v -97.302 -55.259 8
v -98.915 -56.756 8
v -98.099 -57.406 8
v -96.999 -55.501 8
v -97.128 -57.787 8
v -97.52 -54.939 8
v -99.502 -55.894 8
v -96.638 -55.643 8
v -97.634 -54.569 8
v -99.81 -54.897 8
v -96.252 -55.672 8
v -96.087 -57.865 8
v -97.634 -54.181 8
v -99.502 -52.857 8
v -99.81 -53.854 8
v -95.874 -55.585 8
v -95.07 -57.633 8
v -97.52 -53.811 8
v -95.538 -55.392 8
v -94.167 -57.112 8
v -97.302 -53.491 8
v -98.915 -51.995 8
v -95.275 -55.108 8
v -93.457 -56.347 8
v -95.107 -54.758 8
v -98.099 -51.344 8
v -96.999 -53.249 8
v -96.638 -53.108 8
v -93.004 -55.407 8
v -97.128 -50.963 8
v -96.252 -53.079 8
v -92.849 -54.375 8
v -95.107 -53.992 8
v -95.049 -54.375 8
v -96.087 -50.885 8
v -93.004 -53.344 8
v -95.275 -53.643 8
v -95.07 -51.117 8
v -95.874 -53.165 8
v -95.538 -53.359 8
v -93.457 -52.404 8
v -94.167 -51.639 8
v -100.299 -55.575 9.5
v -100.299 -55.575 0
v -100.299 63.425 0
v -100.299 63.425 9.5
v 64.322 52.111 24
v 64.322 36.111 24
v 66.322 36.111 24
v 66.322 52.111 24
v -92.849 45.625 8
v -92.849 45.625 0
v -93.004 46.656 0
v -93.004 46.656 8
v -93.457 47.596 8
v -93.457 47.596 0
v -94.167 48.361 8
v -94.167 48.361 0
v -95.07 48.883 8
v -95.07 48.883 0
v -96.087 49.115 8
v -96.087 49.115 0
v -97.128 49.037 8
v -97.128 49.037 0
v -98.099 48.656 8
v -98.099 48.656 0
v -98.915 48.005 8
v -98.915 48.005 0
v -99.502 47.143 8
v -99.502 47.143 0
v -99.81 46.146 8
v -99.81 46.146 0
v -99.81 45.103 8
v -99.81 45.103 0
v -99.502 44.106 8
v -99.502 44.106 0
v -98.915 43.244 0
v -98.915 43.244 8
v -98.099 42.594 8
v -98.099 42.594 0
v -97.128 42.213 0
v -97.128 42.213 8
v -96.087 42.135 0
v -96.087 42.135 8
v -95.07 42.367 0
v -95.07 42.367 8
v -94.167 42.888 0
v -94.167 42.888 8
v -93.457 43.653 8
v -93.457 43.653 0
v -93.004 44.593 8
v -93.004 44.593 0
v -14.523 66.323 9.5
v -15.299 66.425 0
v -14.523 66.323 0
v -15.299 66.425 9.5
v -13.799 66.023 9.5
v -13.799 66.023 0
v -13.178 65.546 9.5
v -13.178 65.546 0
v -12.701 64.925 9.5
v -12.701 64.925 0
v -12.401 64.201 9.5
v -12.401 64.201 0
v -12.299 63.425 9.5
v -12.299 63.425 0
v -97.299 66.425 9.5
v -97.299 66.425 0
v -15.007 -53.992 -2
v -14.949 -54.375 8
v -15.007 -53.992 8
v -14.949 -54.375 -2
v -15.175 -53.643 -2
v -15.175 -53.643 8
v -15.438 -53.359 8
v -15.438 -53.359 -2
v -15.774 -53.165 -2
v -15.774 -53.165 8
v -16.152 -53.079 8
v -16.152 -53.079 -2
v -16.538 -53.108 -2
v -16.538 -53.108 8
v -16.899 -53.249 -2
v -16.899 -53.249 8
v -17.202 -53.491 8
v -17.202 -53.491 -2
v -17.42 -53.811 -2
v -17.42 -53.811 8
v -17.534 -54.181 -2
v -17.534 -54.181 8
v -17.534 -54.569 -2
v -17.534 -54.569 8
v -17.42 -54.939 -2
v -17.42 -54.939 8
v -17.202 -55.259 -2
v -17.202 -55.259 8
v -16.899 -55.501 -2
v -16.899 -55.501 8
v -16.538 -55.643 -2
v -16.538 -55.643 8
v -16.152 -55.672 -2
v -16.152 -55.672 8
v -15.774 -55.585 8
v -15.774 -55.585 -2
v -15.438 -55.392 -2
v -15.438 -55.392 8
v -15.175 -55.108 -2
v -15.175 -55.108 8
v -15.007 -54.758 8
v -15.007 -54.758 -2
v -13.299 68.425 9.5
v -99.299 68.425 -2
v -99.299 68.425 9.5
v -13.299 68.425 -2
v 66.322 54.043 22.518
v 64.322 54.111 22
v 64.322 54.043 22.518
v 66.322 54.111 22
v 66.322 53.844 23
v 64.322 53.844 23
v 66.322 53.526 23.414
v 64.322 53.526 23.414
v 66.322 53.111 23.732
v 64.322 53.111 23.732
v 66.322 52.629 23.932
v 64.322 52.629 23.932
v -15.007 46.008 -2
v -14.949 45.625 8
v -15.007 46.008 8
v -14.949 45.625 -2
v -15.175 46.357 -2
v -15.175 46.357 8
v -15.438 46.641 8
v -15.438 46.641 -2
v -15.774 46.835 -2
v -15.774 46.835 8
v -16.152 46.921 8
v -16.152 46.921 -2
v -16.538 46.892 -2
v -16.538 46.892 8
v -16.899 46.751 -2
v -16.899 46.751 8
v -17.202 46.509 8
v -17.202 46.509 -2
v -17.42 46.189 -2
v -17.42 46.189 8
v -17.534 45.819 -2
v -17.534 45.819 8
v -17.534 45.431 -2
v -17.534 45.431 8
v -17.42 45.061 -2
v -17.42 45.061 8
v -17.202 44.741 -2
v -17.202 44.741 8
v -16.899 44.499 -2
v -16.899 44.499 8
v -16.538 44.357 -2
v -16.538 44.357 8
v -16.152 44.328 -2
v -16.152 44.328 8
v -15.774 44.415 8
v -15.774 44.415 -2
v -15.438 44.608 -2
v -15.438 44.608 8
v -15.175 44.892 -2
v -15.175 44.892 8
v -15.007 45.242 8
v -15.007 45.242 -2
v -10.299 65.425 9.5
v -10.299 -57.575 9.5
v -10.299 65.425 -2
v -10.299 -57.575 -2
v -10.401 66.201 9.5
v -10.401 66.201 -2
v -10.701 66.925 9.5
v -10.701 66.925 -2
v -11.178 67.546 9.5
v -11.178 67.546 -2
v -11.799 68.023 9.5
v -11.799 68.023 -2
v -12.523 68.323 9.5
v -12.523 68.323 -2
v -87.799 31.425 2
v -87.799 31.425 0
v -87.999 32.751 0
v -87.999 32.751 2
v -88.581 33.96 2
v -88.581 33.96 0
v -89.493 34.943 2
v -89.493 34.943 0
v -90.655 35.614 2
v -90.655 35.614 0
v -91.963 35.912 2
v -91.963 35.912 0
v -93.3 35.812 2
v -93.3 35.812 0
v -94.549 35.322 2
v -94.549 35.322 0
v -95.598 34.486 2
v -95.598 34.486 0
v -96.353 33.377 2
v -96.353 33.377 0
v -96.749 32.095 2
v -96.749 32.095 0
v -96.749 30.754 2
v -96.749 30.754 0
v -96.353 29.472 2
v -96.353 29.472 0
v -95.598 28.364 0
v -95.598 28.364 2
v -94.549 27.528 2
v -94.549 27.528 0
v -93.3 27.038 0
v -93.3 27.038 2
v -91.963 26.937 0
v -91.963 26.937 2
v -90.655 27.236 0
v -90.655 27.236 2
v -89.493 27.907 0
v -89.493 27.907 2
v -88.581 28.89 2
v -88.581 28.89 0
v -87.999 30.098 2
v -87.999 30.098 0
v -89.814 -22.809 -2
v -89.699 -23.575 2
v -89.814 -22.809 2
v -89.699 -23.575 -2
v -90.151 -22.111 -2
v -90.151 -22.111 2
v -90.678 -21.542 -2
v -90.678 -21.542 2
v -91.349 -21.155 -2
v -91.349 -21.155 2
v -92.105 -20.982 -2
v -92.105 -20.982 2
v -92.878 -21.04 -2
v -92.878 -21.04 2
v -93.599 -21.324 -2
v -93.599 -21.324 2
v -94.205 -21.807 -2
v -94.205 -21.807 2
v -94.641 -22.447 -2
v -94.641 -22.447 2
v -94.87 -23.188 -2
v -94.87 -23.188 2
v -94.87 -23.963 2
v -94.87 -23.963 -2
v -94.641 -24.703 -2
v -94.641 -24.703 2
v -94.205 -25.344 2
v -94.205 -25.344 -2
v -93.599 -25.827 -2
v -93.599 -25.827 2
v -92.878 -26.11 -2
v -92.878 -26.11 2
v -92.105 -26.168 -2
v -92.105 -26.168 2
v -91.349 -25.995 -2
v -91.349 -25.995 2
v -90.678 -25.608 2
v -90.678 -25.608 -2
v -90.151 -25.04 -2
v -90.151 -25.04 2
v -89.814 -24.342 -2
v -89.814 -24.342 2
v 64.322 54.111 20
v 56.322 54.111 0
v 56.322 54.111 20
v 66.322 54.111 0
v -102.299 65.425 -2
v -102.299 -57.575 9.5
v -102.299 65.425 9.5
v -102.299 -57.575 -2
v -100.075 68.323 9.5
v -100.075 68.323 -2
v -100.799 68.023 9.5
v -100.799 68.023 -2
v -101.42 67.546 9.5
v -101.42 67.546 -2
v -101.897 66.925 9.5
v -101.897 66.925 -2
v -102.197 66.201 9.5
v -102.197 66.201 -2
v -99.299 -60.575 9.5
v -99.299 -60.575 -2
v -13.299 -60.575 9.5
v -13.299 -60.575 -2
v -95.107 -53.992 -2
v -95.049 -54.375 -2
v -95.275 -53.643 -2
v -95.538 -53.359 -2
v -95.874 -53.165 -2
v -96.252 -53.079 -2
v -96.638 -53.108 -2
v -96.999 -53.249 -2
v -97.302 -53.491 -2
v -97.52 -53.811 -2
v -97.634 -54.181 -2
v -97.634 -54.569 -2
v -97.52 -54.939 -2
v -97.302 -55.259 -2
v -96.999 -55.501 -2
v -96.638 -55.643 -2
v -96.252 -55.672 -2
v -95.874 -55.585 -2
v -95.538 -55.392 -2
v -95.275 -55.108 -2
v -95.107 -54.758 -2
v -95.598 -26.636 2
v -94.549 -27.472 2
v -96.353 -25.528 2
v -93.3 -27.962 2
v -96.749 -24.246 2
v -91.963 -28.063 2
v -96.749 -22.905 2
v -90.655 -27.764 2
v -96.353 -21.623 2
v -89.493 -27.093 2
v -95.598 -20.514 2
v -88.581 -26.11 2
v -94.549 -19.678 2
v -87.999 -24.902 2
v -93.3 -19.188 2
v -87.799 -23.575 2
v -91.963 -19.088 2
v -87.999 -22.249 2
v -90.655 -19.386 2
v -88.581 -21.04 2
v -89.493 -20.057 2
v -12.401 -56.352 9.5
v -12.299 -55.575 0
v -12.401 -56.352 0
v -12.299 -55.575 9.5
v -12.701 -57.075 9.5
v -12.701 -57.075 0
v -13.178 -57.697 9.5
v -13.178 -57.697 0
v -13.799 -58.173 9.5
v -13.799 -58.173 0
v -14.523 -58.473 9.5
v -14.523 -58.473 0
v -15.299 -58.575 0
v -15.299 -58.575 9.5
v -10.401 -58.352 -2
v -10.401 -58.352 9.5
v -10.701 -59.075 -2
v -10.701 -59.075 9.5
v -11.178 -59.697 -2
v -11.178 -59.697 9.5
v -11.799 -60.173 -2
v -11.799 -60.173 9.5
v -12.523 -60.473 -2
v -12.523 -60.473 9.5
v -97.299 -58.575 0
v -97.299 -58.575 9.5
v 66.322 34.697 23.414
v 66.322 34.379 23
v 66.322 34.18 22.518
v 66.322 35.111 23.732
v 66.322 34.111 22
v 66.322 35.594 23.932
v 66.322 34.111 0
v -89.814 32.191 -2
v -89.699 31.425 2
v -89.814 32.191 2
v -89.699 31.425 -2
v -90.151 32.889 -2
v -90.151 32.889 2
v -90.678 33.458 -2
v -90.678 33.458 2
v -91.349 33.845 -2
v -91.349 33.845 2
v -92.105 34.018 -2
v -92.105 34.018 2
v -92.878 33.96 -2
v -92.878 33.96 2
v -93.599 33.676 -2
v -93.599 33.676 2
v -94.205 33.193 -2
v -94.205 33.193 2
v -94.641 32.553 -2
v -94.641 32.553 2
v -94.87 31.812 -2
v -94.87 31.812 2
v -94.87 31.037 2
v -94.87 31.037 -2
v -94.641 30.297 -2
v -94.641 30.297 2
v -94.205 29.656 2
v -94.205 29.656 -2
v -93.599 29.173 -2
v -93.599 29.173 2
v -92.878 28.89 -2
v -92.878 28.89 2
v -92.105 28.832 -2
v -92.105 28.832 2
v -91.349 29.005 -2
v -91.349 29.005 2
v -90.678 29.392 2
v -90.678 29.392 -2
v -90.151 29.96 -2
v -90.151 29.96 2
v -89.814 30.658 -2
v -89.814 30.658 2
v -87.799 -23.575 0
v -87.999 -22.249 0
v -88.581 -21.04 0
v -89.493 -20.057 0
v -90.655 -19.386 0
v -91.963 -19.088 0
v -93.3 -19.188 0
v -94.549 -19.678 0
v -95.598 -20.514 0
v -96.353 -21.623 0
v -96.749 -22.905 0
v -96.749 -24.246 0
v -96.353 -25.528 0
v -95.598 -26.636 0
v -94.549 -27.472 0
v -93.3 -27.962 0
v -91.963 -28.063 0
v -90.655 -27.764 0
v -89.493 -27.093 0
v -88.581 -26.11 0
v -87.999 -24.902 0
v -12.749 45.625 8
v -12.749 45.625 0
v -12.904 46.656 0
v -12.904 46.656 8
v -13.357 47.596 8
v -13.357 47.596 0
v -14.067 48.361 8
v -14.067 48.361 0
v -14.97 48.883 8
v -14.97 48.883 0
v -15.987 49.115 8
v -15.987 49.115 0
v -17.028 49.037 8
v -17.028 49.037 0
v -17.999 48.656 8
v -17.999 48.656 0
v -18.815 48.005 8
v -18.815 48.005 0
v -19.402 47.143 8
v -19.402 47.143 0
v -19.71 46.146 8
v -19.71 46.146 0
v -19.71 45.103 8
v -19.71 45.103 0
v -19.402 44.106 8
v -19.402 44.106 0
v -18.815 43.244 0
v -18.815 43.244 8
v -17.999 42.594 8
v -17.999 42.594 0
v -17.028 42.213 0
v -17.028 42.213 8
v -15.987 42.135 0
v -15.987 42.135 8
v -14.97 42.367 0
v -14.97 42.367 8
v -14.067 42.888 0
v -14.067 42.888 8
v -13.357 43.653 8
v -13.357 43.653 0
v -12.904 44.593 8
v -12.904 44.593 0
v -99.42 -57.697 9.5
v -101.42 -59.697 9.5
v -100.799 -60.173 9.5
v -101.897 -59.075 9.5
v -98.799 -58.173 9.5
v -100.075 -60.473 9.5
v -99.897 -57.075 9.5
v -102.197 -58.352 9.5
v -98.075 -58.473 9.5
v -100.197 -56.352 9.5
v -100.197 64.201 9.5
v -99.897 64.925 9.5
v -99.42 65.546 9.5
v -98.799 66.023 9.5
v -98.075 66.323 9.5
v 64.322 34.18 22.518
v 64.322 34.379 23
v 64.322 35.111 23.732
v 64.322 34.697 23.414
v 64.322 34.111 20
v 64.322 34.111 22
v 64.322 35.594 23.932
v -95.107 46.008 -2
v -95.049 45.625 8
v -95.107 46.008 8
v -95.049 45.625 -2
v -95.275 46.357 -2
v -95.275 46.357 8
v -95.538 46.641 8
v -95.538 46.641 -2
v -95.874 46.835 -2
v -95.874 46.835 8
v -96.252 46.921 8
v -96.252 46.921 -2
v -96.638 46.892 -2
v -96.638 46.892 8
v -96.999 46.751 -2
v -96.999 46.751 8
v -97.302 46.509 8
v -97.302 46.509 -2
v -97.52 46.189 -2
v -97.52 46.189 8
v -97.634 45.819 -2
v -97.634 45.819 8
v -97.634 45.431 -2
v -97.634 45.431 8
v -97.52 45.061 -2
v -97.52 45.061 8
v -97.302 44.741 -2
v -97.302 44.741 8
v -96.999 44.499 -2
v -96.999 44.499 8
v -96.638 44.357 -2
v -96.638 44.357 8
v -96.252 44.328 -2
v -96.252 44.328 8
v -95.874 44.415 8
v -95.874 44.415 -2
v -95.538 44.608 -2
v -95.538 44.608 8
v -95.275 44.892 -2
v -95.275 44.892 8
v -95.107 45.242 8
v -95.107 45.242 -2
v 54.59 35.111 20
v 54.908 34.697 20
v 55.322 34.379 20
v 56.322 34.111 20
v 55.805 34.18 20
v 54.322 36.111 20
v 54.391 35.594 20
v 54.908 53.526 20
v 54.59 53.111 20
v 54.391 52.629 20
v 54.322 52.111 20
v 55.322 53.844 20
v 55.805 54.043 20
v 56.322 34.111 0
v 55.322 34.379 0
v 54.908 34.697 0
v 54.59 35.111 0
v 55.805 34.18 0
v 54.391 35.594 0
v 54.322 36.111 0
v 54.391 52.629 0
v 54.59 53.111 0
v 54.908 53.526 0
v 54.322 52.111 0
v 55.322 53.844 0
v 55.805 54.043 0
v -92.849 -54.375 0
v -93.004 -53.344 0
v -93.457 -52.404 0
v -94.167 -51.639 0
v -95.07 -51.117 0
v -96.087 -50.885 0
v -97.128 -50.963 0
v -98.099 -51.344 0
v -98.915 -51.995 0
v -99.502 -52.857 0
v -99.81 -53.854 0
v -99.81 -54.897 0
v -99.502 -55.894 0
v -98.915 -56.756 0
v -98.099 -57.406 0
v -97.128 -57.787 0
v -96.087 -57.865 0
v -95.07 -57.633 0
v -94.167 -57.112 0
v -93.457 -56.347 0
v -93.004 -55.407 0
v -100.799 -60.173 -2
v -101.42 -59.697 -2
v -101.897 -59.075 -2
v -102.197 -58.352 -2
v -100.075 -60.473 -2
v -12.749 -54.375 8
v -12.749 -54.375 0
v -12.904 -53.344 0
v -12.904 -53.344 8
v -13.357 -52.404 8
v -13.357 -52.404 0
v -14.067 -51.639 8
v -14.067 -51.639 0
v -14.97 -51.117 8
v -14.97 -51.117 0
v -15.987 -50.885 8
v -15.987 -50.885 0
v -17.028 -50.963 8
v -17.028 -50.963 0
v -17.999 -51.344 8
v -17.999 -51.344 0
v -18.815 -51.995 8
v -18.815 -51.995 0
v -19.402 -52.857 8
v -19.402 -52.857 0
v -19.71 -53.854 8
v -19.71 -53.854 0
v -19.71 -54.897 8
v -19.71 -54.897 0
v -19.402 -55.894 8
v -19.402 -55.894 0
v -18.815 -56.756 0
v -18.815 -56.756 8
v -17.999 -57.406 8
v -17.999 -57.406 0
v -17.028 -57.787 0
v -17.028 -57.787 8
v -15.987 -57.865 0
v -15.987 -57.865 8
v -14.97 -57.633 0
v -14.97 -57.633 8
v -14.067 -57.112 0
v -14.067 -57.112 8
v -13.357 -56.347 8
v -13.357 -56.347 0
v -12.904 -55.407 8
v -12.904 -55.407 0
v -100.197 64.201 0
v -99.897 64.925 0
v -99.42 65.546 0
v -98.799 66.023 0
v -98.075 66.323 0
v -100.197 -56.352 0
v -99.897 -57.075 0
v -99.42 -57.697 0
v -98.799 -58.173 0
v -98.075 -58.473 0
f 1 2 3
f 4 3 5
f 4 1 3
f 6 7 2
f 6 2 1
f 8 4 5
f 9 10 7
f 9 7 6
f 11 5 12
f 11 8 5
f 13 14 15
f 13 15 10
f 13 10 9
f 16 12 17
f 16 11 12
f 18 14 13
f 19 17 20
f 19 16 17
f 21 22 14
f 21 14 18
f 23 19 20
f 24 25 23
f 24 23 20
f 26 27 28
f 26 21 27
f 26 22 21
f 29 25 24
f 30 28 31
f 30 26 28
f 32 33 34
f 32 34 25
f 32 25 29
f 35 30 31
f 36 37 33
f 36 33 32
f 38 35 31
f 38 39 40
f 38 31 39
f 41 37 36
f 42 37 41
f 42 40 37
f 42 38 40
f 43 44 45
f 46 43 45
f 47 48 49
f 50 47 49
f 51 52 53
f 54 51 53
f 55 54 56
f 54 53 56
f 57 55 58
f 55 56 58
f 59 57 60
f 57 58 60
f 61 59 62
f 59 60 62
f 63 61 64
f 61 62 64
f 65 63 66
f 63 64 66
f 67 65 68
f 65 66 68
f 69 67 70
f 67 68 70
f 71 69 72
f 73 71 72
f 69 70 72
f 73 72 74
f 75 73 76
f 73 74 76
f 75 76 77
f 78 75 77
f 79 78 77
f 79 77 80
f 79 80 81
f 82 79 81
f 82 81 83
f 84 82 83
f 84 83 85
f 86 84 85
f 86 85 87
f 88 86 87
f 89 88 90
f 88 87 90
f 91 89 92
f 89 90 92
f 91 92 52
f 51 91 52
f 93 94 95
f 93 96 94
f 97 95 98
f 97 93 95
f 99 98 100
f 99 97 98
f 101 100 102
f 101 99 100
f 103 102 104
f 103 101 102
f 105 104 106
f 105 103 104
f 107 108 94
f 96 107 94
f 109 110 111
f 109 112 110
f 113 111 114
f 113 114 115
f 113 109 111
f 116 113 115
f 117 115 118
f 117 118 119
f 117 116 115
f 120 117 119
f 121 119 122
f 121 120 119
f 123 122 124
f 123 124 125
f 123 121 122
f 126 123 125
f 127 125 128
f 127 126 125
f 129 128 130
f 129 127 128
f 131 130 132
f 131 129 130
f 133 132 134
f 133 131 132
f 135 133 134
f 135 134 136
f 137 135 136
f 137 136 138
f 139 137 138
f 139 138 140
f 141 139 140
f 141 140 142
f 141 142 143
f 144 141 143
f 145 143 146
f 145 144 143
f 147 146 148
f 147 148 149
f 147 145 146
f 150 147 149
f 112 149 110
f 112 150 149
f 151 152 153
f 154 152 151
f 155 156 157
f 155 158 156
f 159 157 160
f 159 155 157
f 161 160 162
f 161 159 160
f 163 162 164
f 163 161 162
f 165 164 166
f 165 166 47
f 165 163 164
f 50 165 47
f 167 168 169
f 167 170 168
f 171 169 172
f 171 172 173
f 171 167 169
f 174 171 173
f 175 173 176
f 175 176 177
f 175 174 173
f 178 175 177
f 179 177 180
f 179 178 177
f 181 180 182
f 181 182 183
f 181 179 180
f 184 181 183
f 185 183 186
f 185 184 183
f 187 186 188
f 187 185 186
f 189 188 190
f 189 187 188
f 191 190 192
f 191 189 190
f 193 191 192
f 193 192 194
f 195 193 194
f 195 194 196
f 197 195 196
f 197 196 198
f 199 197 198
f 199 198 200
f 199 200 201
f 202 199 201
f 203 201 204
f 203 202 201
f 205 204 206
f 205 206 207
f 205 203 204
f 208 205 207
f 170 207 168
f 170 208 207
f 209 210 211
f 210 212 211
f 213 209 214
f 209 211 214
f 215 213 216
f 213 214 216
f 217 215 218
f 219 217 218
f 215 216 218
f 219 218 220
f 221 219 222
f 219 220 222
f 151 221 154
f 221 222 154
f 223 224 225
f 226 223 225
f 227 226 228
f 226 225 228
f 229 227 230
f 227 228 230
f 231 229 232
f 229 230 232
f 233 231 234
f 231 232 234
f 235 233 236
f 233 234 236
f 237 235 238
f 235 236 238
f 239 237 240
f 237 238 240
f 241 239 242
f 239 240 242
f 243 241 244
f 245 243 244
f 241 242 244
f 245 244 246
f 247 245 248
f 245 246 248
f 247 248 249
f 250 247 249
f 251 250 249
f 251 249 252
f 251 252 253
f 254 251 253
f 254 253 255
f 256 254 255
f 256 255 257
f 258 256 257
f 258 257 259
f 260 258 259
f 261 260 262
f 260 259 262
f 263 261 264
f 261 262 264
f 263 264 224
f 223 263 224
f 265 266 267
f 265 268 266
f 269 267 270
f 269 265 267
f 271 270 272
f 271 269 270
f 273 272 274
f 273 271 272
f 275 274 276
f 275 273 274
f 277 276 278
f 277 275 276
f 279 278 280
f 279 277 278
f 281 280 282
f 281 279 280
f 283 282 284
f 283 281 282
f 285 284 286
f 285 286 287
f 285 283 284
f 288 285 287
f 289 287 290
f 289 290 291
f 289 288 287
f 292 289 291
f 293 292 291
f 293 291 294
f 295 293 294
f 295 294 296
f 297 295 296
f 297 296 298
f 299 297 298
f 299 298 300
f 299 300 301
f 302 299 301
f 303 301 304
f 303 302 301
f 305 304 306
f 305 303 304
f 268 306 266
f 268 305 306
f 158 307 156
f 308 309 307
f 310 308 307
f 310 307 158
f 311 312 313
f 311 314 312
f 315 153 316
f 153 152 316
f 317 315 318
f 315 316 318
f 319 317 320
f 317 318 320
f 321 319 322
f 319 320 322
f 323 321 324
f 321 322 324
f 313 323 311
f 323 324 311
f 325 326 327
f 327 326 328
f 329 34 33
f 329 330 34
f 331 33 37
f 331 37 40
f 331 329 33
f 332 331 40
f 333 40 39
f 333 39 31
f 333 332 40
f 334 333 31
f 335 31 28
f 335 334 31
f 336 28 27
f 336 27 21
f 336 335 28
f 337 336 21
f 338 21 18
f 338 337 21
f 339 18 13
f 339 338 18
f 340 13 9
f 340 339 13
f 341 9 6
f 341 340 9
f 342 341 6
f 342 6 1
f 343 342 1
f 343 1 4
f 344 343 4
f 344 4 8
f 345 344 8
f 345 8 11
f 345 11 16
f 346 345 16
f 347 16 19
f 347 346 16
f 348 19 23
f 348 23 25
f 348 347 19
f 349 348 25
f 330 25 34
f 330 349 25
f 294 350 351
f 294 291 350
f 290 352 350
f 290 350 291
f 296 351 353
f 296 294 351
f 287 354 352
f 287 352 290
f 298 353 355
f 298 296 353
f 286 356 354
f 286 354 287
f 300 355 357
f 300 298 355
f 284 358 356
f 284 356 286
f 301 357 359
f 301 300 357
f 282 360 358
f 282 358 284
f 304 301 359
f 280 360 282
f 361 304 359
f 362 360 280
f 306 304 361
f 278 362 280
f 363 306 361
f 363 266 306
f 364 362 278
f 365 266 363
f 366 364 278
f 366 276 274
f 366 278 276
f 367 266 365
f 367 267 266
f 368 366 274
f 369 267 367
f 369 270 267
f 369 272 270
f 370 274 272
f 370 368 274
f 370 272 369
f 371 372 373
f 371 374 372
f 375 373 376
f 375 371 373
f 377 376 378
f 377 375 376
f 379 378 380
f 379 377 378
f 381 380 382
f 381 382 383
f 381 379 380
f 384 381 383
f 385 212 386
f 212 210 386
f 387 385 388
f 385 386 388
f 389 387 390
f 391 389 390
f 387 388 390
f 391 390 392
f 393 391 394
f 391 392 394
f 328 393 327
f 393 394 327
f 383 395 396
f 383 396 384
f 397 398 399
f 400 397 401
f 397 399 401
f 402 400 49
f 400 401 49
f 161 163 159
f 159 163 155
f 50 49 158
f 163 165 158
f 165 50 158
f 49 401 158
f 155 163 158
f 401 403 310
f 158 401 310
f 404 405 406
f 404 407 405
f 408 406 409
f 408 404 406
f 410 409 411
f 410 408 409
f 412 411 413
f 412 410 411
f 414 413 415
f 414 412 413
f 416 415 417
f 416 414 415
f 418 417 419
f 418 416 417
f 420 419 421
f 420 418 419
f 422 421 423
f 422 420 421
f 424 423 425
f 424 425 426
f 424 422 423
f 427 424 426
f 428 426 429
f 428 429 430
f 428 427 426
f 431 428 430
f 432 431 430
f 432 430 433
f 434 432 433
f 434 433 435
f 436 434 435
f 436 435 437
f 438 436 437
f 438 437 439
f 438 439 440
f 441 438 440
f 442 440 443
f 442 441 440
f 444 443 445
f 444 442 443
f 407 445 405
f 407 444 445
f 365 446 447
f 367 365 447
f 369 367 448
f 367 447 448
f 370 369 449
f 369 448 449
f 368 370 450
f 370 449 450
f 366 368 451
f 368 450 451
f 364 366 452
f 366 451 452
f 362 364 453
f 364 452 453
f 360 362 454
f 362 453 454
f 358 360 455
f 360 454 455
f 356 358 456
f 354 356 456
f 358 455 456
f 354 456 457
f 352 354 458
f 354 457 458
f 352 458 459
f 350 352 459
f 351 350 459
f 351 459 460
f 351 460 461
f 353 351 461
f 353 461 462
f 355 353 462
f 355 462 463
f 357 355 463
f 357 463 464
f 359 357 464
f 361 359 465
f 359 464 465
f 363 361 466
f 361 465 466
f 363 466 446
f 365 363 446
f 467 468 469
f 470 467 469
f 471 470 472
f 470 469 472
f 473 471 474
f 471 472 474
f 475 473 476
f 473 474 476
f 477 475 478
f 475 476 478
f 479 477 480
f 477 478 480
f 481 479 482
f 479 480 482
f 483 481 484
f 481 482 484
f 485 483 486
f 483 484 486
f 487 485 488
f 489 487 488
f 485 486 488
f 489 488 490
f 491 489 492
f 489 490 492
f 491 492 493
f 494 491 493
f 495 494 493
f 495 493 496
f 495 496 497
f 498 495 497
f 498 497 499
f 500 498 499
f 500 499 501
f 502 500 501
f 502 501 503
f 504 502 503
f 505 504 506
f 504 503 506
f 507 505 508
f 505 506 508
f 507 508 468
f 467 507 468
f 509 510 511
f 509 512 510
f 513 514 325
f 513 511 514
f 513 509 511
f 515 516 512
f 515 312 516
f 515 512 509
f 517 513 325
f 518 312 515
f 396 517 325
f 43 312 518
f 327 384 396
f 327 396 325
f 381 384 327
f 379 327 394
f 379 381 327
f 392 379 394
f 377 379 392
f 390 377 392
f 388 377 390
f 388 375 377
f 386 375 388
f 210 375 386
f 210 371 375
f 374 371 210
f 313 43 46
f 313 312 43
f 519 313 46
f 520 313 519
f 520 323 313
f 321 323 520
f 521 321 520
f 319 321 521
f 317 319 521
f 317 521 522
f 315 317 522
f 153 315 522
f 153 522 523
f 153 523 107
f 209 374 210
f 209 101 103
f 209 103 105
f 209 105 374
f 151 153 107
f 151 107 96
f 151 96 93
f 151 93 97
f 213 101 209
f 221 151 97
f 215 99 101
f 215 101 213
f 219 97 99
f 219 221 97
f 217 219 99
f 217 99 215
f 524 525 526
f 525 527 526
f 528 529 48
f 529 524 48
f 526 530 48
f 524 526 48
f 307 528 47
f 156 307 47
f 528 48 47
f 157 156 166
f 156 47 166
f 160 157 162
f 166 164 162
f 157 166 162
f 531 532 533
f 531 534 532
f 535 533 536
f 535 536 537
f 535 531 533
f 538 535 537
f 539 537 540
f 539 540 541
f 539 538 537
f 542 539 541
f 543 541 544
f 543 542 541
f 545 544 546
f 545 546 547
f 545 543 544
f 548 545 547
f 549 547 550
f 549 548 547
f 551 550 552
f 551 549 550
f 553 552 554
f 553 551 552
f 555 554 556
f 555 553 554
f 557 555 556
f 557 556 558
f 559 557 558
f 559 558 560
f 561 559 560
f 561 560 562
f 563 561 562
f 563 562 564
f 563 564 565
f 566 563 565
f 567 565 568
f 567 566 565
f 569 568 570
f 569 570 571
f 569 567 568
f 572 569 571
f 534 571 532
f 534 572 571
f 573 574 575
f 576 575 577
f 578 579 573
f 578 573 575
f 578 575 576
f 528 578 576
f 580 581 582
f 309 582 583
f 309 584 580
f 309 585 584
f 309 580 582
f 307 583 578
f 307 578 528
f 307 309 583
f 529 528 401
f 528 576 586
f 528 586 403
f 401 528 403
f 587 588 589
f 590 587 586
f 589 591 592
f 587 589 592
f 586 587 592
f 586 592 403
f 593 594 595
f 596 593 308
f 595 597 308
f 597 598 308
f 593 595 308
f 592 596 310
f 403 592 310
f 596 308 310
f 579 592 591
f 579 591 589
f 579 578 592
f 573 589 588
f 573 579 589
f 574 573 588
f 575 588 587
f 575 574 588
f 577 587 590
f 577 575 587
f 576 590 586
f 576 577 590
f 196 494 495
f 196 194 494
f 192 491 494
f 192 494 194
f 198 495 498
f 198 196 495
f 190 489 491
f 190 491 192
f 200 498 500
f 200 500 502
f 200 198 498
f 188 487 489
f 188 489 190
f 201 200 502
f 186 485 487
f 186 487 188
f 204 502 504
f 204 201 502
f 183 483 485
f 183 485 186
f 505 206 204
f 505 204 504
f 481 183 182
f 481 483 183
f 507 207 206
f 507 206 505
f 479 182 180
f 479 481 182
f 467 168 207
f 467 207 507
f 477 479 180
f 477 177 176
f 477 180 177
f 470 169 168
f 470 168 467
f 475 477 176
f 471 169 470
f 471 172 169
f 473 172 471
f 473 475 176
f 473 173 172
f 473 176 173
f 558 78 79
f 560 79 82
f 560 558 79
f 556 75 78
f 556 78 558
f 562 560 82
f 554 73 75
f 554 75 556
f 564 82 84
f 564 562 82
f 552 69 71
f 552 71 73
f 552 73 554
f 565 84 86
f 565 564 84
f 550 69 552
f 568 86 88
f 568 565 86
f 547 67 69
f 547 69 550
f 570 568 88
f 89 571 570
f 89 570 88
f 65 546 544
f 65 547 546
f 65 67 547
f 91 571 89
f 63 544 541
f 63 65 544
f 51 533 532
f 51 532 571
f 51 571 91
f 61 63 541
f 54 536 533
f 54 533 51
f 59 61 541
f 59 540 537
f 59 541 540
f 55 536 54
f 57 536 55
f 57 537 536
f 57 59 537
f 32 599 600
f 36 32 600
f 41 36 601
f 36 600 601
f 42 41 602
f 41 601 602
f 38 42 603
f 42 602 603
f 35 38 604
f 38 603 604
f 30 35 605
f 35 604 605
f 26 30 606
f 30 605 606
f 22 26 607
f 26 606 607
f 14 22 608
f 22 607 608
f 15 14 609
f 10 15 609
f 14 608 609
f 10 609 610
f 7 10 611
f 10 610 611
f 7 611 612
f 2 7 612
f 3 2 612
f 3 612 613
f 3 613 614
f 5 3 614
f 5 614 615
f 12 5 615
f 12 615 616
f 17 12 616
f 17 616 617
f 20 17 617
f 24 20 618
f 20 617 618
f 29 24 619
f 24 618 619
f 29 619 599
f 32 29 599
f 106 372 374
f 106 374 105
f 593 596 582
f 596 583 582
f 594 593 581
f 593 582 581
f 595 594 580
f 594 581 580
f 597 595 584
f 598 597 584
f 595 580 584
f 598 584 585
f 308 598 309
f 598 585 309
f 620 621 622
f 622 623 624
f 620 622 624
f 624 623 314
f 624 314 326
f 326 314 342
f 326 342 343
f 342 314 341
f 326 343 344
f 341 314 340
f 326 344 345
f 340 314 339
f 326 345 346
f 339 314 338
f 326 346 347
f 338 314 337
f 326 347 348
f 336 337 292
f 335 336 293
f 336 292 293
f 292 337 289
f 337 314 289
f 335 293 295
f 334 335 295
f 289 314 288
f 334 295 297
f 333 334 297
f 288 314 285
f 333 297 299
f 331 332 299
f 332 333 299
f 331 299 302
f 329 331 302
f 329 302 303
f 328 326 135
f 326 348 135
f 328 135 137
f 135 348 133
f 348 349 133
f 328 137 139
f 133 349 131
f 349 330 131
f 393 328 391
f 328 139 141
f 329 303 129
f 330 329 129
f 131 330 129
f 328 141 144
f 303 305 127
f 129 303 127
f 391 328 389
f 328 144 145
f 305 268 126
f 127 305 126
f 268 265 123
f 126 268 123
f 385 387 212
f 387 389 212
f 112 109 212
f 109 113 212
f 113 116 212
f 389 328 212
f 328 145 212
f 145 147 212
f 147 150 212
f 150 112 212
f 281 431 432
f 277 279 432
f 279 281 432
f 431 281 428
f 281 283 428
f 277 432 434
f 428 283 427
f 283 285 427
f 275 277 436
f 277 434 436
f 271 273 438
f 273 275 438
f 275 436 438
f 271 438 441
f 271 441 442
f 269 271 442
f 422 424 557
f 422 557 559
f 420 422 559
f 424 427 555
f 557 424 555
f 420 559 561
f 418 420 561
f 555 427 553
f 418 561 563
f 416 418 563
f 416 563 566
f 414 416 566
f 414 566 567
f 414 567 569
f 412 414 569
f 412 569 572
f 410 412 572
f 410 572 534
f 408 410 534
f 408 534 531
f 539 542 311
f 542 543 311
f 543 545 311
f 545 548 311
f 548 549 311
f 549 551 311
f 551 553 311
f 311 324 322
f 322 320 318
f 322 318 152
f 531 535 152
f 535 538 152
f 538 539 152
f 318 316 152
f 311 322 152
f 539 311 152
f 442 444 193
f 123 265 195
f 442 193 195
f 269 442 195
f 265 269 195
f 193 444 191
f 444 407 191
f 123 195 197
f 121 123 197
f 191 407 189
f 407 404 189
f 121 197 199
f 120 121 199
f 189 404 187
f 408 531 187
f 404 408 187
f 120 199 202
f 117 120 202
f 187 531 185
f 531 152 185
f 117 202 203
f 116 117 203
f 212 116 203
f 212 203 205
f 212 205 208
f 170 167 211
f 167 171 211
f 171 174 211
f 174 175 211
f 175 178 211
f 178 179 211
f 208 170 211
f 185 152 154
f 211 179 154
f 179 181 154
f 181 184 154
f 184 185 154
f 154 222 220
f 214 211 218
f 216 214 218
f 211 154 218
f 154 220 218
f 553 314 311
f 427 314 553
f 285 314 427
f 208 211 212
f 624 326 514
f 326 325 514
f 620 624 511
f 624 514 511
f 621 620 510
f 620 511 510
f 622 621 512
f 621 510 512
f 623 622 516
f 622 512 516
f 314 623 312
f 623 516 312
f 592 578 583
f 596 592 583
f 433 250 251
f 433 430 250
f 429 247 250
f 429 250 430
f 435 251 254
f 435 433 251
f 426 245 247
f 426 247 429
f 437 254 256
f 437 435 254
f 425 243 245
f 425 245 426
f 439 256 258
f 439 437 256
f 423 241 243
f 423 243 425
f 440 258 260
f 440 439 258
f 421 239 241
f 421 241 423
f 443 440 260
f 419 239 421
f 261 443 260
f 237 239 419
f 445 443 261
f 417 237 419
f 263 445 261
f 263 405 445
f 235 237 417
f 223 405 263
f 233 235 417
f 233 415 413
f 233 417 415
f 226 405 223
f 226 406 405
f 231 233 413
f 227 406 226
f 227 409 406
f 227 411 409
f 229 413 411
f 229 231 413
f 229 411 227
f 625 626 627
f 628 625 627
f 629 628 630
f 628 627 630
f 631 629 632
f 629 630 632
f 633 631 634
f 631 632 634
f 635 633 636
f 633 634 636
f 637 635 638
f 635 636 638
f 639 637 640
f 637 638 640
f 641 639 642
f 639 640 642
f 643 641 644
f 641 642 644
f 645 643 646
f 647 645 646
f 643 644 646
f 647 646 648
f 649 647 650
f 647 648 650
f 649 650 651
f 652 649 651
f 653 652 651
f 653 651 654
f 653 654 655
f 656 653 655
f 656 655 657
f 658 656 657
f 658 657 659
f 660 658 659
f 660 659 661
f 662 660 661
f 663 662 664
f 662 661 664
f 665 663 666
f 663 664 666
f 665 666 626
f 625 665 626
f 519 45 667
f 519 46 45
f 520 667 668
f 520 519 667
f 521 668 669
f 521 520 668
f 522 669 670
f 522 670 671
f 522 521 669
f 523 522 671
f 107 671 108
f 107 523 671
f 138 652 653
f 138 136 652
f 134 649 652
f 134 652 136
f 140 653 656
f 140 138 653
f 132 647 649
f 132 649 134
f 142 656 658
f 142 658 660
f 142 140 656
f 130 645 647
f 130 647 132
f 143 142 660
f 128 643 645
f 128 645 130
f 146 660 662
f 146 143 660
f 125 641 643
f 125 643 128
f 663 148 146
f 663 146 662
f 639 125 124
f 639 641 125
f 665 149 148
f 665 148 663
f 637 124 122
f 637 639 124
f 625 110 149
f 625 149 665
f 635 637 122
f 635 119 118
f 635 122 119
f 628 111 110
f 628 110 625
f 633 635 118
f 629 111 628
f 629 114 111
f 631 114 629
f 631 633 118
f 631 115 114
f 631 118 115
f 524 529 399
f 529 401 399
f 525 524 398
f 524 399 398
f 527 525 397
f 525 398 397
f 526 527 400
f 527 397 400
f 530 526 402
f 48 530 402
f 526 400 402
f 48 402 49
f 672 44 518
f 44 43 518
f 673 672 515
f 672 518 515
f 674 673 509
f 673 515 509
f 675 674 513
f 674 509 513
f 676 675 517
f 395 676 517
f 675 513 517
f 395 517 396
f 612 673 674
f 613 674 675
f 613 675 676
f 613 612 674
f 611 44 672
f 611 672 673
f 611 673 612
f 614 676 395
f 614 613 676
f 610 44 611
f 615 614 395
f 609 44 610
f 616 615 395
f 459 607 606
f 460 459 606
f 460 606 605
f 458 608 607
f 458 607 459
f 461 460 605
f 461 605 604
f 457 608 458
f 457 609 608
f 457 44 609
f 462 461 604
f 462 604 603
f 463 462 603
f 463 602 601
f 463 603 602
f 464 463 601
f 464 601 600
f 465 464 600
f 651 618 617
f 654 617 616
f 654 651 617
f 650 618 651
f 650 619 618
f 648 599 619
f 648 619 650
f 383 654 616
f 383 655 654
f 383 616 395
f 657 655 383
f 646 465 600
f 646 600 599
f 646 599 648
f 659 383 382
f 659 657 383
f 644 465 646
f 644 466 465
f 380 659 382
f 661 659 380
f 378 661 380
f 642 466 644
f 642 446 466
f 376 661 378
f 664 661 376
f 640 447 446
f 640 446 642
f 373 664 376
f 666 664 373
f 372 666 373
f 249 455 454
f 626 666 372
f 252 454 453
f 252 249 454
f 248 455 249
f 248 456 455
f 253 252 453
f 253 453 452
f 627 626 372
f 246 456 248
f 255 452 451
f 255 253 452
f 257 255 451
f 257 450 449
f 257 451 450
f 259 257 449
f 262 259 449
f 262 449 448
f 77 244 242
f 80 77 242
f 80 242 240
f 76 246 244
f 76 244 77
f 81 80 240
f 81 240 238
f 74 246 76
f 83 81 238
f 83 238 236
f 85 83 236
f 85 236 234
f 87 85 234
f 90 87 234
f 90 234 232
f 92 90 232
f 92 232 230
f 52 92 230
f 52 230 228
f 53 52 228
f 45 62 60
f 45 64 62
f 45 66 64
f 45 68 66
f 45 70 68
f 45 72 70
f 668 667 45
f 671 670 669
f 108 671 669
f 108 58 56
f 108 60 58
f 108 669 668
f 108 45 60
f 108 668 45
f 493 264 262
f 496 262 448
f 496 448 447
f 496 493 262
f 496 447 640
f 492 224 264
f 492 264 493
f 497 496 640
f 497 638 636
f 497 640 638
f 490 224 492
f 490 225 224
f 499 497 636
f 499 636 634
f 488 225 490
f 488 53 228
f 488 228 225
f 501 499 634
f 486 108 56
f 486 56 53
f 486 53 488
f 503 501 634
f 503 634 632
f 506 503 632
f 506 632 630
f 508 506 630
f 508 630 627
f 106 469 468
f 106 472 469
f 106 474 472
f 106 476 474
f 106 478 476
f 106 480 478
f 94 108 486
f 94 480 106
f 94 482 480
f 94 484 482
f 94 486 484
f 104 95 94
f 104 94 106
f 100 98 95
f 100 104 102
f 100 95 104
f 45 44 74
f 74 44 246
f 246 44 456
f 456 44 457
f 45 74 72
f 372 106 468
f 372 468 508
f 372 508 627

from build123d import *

# Parameters (mm, degrees)
F0_W     = 92
F0_H     = 129
F0_W_2   = 88
F0_H_2   = 125
F0_R     = 3.5
F0_R_2   = 4.5
F0_R_3   = 2.6
F0_R_4   = 1.3
F1_DEPTH = 2
F2_DEPTH = 9.5
F3_DEPTH = 2
F4_DEPTH = 8
F5_R     = 3
F6_W     = 12
F6_H     = 20
F7_DEPTH = 24
F8_W     = 10
F8_H     = 20
F9_DEPTH = 4
F10_R    = 2


with BuildPart() as f1:
    # F0 (on Top) → F1 (new body)
    with BuildSketch(Plane.XY):
        with Locations((-56.2989712238, 3.9247941673)):
            Rectangle(F0_W, F0_H)
        with Locations((-56.2989712238, 3.9247941673)):
            Rectangle(F0_W_2, F0_H_2, mode=Mode.SUBTRACT)
        with Locations((-56.2989712238, 3.9247941673)):
            Rectangle(F0_W_2, F0_H_2)
        with Locations((-96.3489712238, -54.3752058327)):
            Circle(F0_R, mode=Mode.SUBTRACT)
        with Locations((-92.2989712238, -23.5752058327)):
            Circle(F0_R_2, mode=Mode.SUBTRACT)
        with Locations((-16.2489712238, -54.3752058327)):
            Circle(F0_R, mode=Mode.SUBTRACT)
        with Locations((-92.2989712238, 31.4247941673)):
            Circle(F0_R_2, mode=Mode.SUBTRACT)
        with Locations((-96.3489712238, 45.6247941673)):
            Circle(F0_R, mode=Mode.SUBTRACT)
        with Locations((-16.2489712238, 45.6247941673)):
            Circle(F0_R, mode=Mode.SUBTRACT)
        with Locations((-92.2989712238, 31.4247941673)):
            Circle(F0_R_2)
        with Locations((-92.2989712238, 31.4247941673)):
            Circle(F0_R_3, mode=Mode.SUBTRACT)
        with Locations((-92.2989712238, -23.5752058327)):
            Circle(F0_R_2)
        with Locations((-92.2989712238, -23.5752058327)):
            Circle(F0_R_3, mode=Mode.SUBTRACT)
        with Locations((-96.3489712238, 45.6247941673)):
            Circle(F0_R)
        with Locations((-96.3489712238, 45.6247941673)):
            Circle(F0_R_4, mode=Mode.SUBTRACT)
        with Locations((-96.3489712238, -54.3752058327)):
            Circle(F0_R)
        with Locations((-96.3489712238, -54.3752058327)):
            Circle(F0_R_4, mode=Mode.SUBTRACT)
        with Locations((-16.2489712238, -54.3752058327)):
            Circle(F0_R)
        with Locations((-16.2489712238, -54.3752058327)):
            Circle(F0_R_4, mode=Mode.SUBTRACT)
        with Locations((-16.2489712238, 45.6247941673)):
            Circle(F0_R)
        with Locations((-16.2489712238, 45.6247941673)):
            Circle(F0_R_4, mode=Mode.SUBTRACT)
    extrude(amount=-F1_DEPTH)

    # F0 (on Top) → F2 (join)
    with BuildSketch(Plane.XY):
        with Locations((-56.2989712238, 3.9247941673)):
            Rectangle(F0_W, F0_H)
        with Locations((-56.2989712238, 3.9247941673)):
            Rectangle(F0_W_2, F0_H_2, mode=Mode.SUBTRACT)
    extrude(amount=F2_DEPTH)

    # F0 (on Top) → F3 (join)
    with BuildSketch(Plane.XY):
        with Locations((-92.2989712238, 31.4247941673)):
            Circle(F0_R_2)
        with Locations((-92.2989712238, 31.4247941673)):
            Circle(F0_R_3, mode=Mode.SUBTRACT)
        with Locations((-92.2989712238, -23.5752058327)):
            Circle(F0_R_2)
        with Locations((-92.2989712238, -23.5752058327)):
            Circle(F0_R_3, mode=Mode.SUBTRACT)
    extrude(amount=F3_DEPTH)

    # F0 (on Top) → F4 (join)
    with BuildSketch(Plane.XY):
        with Locations((-96.3489712238, 45.6247941673)):
            Circle(F0_R)
        with Locations((-96.3489712238, 45.6247941673)):
            Circle(F0_R_4, mode=Mode.SUBTRACT)
        with Locations((-96.3489712238, -54.3752058327)):
            Circle(F0_R)
        with Locations((-96.3489712238, -54.3752058327)):
            Circle(F0_R_4, mode=Mode.SUBTRACT)
        with Locations((-16.2489712238, 45.6247941673)):
            Circle(F0_R)
        with Locations((-16.2489712238, 45.6247941673)):
            Circle(F0_R_4, mode=Mode.SUBTRACT)
        with Locations((-16.2489712238, -54.3752058327)):
            Circle(F0_R)
        with Locations((-16.2489712238, -54.3752058327)):
            Circle(F0_R_4, mode=Mode.SUBTRACT)
    extrude(amount=F4_DEPTH)

    # F5
    f5_edges = [f1.edges().sort_by_distance(p)[0] for p in [
        (-100.298971, 66.424794, 4.75),
        (-12.298971, 66.424794, 4.75),
        (-100.298971, -58.575206, 4.75),
        (-12.298971, -58.575206, 4.75),
        (-10.298971, 68.424794, 3.75),
        (-102.298971, 68.424794, 3.75),
        (-10.298971, -60.575206, 3.75),
        (-102.298971, -60.575206, 3.75),
    ]]
    fillet(f5_edges, radius=F5_R)


with BuildPart() as f7:
    # F6 (on Top) → F7 (new body)
    with BuildSketch(Plane.XY):
        with Locations((60.3223639131, 44.1114662588)):
            Rectangle(F6_W, F6_H)
    extrude(amount=F7_DEPTH)

    # F8 (on face) → F9 (cut)
    with BuildSketch(Plane.XY.offset(24)):
        with Locations((59.3223639131, 44.1114662588)):
            Rectangle(F8_W, F8_H)
    extrude(amount=-F9_DEPTH, mode=Mode.SUBTRACT)

    # F10
    f10_edges = [f7.edges().sort_by_distance(p)[0] for p in [
        (65.322364, 34.111466, 24),
        (65.322364, 54.111466, 24),
        (54.322364, 34.111466, 10),
        (54.322364, 54.111466, 10),
    ]]
    fillet(f10_edges, radius=F10_R)


solid = Compound([f1.part, f7.part])
